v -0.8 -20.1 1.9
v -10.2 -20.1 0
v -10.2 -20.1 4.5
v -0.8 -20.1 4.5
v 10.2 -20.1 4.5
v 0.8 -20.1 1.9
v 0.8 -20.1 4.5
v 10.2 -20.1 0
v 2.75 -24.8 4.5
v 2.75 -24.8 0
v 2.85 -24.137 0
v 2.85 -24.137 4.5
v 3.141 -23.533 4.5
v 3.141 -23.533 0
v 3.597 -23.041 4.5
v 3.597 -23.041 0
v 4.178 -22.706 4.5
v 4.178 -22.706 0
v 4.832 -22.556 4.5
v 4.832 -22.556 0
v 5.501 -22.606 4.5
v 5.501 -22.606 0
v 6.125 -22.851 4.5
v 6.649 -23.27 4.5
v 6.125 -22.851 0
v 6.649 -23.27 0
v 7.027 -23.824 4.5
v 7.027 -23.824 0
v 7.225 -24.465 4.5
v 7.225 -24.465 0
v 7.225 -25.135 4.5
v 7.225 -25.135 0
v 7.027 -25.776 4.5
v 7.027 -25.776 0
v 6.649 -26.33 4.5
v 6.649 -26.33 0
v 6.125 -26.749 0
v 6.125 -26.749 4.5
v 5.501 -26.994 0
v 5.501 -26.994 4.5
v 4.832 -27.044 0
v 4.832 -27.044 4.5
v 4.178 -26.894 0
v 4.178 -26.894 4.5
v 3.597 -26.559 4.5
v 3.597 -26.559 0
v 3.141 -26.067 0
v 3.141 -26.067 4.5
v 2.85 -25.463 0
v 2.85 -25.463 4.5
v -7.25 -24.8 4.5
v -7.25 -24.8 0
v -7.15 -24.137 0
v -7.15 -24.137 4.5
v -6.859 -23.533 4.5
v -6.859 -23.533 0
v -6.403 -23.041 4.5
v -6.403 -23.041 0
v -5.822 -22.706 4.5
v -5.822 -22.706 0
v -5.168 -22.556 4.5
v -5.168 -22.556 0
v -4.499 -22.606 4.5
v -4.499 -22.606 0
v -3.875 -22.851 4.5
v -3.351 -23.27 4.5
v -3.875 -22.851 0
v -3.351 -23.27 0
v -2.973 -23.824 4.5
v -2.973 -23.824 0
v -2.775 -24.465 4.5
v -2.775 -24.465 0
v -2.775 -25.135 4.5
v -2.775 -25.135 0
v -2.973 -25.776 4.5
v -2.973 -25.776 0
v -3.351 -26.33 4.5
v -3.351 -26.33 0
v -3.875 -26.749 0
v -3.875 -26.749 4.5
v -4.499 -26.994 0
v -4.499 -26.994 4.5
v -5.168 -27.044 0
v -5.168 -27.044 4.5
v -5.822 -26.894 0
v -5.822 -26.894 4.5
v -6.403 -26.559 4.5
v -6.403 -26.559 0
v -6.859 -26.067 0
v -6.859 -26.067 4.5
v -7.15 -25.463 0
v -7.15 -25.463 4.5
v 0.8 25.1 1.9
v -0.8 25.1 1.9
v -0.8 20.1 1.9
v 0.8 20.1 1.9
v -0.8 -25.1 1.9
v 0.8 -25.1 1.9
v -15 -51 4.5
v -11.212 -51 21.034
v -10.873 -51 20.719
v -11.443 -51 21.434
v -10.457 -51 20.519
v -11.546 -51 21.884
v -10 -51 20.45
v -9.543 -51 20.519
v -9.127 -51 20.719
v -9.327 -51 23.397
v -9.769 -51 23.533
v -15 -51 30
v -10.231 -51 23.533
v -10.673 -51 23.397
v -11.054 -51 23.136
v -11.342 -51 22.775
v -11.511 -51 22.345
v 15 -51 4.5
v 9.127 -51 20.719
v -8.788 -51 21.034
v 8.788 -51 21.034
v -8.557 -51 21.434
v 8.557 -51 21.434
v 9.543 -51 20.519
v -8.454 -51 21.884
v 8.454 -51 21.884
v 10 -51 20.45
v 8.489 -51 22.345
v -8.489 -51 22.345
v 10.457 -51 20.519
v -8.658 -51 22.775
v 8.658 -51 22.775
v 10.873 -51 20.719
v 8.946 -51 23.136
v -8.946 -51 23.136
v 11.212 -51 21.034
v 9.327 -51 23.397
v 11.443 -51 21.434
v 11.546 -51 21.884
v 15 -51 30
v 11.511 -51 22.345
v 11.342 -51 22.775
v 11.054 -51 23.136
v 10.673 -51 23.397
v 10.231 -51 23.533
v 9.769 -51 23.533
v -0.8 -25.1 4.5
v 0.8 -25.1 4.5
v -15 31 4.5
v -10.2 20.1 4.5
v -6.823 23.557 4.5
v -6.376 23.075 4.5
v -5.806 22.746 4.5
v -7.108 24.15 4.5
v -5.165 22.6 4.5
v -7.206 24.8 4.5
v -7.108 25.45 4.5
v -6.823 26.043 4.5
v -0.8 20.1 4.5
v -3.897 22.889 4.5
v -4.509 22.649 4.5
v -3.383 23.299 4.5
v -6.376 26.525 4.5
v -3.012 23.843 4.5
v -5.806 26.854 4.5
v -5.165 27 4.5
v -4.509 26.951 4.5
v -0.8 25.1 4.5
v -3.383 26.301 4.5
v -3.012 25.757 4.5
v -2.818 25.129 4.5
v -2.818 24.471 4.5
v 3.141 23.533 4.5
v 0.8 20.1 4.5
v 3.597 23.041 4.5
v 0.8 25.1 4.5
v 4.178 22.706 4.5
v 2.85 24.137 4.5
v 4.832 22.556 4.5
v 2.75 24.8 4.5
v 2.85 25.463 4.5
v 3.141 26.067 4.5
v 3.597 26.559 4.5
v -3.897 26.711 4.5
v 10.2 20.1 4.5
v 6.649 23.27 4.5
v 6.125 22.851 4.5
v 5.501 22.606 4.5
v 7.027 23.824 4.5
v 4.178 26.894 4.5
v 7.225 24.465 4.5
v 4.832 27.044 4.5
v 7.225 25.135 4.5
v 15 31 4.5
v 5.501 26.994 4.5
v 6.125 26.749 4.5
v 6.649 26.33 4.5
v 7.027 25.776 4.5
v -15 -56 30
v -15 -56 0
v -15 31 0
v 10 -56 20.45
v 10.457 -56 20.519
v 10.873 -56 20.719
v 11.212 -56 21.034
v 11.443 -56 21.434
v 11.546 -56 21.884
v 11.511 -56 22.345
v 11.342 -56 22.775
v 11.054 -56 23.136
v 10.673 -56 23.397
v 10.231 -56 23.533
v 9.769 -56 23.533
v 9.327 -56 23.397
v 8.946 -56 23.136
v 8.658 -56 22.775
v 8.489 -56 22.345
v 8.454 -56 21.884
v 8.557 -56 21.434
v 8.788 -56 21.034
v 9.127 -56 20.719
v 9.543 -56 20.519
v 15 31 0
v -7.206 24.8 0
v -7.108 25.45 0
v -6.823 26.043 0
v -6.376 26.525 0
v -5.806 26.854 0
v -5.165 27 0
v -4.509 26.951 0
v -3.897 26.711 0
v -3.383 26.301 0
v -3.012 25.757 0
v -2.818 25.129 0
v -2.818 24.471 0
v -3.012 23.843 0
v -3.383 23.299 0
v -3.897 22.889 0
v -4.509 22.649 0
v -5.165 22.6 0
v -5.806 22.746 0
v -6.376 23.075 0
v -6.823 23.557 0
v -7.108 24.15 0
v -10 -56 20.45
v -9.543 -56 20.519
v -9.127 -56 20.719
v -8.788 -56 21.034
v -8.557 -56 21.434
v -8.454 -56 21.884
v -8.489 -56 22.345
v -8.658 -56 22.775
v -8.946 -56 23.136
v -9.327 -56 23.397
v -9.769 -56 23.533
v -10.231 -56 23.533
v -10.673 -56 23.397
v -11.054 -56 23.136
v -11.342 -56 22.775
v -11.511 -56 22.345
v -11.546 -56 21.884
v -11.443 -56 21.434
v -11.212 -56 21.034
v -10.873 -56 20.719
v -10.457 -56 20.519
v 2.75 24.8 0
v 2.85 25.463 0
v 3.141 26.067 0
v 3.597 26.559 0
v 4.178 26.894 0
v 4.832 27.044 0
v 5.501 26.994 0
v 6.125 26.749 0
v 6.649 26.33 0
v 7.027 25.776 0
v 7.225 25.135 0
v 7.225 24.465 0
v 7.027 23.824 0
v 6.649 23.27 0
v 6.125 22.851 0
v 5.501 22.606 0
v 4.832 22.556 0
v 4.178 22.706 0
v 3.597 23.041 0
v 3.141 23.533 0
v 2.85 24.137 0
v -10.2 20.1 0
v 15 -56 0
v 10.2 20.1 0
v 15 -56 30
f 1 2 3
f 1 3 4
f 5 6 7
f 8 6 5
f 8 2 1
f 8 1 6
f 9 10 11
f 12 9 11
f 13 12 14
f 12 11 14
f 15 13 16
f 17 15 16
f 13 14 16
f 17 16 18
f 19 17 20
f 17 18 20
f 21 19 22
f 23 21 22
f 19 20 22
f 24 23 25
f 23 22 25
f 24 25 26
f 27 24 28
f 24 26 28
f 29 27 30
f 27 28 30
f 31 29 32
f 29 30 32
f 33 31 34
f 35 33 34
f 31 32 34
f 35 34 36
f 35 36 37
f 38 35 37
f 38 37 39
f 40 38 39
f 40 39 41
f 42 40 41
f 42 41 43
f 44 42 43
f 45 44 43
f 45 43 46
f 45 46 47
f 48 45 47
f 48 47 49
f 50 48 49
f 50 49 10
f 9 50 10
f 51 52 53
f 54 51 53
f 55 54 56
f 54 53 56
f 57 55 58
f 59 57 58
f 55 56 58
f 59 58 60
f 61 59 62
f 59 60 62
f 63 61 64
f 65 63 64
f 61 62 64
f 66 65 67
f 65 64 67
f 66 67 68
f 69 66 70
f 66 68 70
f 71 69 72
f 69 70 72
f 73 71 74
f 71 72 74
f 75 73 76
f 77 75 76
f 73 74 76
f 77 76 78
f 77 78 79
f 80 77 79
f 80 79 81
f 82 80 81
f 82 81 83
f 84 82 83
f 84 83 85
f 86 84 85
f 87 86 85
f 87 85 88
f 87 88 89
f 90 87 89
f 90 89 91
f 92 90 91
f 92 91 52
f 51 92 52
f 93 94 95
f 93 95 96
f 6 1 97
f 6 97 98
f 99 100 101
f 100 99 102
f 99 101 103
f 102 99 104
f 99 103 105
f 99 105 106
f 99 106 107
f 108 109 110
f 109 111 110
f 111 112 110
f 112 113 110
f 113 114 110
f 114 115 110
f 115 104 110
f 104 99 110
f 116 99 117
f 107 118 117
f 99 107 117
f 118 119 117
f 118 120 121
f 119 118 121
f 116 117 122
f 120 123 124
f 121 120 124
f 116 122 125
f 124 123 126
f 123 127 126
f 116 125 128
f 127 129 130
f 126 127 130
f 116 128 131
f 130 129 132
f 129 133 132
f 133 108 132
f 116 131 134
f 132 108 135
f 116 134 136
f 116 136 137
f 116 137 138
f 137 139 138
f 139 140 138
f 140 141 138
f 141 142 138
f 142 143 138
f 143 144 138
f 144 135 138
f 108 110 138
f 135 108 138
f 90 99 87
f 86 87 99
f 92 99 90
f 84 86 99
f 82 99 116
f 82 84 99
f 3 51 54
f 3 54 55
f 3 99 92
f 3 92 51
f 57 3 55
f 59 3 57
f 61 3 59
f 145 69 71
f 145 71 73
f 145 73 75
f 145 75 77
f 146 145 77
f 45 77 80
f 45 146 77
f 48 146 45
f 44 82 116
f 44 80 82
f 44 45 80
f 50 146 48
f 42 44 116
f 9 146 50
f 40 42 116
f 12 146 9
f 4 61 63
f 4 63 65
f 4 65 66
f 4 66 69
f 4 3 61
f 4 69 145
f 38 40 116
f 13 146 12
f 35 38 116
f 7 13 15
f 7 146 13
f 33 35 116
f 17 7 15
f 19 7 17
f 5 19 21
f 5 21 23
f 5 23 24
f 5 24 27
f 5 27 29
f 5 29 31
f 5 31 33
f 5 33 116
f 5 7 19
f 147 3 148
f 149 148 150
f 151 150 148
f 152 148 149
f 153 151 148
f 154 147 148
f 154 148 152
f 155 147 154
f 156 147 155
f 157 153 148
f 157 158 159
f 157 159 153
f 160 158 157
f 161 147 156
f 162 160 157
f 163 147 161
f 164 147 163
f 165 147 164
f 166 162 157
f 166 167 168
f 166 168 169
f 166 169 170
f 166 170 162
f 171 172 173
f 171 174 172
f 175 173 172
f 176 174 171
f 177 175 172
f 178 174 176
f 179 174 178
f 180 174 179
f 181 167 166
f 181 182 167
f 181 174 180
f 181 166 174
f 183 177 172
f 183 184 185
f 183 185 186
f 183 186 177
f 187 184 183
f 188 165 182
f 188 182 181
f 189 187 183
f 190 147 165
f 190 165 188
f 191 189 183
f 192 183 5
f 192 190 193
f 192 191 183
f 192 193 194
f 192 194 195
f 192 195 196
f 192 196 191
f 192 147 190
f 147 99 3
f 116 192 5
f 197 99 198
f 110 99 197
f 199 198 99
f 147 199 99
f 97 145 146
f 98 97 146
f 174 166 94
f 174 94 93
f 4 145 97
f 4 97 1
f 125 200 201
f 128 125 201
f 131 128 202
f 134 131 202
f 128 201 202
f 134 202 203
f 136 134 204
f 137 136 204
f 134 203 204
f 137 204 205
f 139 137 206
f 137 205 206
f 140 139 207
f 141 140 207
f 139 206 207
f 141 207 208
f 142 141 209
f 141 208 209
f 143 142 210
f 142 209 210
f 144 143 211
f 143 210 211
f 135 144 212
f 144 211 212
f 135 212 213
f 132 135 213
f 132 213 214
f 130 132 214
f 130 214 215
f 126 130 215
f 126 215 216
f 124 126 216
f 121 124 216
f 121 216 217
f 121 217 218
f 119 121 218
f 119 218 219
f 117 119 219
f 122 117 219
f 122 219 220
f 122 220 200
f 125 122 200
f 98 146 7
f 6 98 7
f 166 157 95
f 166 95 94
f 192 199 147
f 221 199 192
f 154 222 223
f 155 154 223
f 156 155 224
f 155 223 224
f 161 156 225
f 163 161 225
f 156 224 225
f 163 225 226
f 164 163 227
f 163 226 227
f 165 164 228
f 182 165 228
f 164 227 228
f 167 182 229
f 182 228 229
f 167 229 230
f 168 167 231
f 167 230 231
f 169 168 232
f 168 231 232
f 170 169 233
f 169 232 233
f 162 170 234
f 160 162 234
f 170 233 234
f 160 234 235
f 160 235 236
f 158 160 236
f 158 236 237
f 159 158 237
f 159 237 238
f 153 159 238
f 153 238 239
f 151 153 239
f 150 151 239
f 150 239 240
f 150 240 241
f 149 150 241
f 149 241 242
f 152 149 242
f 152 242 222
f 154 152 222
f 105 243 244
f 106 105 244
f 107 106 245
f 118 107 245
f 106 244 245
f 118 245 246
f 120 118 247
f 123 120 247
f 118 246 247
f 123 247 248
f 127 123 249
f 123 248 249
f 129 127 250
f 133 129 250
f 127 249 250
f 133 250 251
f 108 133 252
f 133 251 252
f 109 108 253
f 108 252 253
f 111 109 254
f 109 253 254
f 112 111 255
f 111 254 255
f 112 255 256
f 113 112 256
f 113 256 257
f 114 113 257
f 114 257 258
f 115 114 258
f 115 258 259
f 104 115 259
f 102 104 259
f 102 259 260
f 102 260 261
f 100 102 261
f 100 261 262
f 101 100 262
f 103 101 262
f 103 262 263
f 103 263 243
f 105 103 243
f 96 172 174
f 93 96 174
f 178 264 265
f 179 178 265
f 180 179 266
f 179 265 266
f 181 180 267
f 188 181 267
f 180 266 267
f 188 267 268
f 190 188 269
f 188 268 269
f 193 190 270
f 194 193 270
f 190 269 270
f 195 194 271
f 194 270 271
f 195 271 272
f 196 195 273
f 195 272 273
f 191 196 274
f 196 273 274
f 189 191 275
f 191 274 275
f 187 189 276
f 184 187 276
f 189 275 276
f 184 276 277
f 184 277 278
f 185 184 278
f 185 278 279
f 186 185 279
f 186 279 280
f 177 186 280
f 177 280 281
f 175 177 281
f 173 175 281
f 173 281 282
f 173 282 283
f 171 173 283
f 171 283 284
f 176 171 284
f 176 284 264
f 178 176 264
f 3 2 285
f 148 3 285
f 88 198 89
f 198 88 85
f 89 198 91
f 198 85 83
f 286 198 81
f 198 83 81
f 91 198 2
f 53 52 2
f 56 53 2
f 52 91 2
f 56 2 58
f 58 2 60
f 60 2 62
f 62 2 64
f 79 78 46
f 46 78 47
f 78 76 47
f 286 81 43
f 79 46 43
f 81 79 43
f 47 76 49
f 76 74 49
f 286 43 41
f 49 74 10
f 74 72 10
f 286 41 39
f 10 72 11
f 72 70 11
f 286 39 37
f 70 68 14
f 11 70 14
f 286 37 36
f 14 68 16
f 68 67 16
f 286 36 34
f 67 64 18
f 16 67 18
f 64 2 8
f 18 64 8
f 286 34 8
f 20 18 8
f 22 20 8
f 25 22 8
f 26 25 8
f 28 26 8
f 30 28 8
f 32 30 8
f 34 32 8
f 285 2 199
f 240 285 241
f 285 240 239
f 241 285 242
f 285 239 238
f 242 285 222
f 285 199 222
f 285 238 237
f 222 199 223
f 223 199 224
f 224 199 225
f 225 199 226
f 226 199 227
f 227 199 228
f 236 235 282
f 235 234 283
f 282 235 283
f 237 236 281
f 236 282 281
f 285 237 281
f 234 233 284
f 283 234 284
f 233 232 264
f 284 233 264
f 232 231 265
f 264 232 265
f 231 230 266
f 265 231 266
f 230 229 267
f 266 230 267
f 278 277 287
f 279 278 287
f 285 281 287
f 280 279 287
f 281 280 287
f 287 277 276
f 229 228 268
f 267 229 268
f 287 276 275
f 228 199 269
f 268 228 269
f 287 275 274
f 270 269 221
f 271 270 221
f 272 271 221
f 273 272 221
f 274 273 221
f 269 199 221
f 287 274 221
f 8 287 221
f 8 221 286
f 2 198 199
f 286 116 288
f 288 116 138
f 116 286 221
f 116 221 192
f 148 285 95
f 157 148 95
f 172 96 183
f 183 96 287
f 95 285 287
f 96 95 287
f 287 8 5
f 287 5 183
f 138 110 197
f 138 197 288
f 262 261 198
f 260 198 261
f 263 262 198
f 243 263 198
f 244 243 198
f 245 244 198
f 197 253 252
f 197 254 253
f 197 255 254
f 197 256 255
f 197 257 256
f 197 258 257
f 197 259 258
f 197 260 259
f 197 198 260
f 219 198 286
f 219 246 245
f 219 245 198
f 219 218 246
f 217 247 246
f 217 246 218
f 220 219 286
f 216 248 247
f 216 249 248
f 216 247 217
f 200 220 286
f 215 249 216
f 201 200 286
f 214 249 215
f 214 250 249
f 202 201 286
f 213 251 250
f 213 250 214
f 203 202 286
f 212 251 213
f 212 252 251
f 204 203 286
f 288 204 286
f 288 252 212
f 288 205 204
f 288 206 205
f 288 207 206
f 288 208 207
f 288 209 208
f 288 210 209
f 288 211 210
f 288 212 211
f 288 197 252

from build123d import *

# Parameters (mm, degrees)
SKETCH_1_W          = 30
SKETCH_1_H          = 62
SKETCH_1_W_2        = 20.4
SKETCH_1_H_2        = 40.2
EXTRUDE_1_DEPTH     = 4.5
SKETCH_3_R          = 2.25
SKETCH_3_R_2        = 2.20649786
CUT_EXTRUDE_1_DEPTH = 35.731109974
SKETCH_5_W          = 30
SKETCH_5_H          = 4.5
EXTRUDE_3_DEPTH     = 20
SKETCH_6_W          = 30
SKETCH_6_H          = 30
EXTRUDE_4_DEPTH     = 5
SKETCH_7_R          = 1.55
CUT_EXTRUDE_2_DEPTH = 94.241621608
SKETCH_8_W          = 1.6
SKETCH_8_H          = 5
CUT_EXTRUDE_3_DEPTH = 2.6


with BuildPart() as part:
    # 草图1 → 凸台-拉伸1 (new body)
    with BuildSketch(Plane.XY):
        Rectangle(SKETCH_1_W, SKETCH_1_H)
        Rectangle(SKETCH_1_W_2, SKETCH_1_H_2, mode=Mode.SUBTRACT)
    extrude(amount=EXTRUDE_1_DEPTH)

    # 草图3 → 切除-拉伸1 (cut, through all)
    with BuildSketch(Plane(origin=(0, 0, 0), x_dir=(-1, 0, 0), z_dir=(0, 0, -1))):
        with Locations((-5, -24.8)):
            Circle(SKETCH_3_R)
        with Locations((5, -24.8)):
            Circle(SKETCH_3_R)
        with Locations((-5, 24.8)):
            Circle(SKETCH_3_R)
        with Locations((5, 24.8)):
            Circle(SKETCH_3_R_2)
    extrude(amount=-CUT_EXTRUDE_1_DEPTH, mode=Mode.SUBTRACT)

    # 草图5 → 凸台-拉伸3 (add)
    with BuildSketch(Plane.XZ.offset(31)):
        with Locations((0, 2.25)):
            Rectangle(SKETCH_5_W, SKETCH_5_H)
    extrude(amount=EXTRUDE_3_DEPTH)

    # 草图6 → 凸台-拉伸4 (add)
    with BuildSketch(Plane.XZ.offset(51)):
        with Locations((0, 15)):
            Rectangle(SKETCH_6_W, SKETCH_6_H)
    extrude(amount=EXTRUDE_4_DEPTH)

    # 草图7 → 切除-拉伸2 (cut, through all)
    with BuildSketch(Plane.XZ.offset(56)):
        with Locations(Location((10, 22, 0), (0, 0, 270))):
            Circle(SKETCH_7_R)
        with Locations(Location((-10, 22, 0), (0, 0, 270))):
            Circle(SKETCH_7_R)
    extrude(amount=-CUT_EXTRUDE_2_DEPTH, mode=Mode.SUBTRACT)

    # 草图8 → 切除-拉伸3 (cut)
    with BuildSketch(Plane.XY.offset(4.5)):
        with Locations((0, -22.6)):
            Rectangle(SKETCH_8_W, SKETCH_8_H)
        with Locations((0, 22.6)):
            Rectangle(SKETCH_8_W, SKETCH_8_H)
    extrude(amount=-CUT_EXTRUDE_3_DEPTH, mode=Mode.SUBTRACT)


solid = part.part
